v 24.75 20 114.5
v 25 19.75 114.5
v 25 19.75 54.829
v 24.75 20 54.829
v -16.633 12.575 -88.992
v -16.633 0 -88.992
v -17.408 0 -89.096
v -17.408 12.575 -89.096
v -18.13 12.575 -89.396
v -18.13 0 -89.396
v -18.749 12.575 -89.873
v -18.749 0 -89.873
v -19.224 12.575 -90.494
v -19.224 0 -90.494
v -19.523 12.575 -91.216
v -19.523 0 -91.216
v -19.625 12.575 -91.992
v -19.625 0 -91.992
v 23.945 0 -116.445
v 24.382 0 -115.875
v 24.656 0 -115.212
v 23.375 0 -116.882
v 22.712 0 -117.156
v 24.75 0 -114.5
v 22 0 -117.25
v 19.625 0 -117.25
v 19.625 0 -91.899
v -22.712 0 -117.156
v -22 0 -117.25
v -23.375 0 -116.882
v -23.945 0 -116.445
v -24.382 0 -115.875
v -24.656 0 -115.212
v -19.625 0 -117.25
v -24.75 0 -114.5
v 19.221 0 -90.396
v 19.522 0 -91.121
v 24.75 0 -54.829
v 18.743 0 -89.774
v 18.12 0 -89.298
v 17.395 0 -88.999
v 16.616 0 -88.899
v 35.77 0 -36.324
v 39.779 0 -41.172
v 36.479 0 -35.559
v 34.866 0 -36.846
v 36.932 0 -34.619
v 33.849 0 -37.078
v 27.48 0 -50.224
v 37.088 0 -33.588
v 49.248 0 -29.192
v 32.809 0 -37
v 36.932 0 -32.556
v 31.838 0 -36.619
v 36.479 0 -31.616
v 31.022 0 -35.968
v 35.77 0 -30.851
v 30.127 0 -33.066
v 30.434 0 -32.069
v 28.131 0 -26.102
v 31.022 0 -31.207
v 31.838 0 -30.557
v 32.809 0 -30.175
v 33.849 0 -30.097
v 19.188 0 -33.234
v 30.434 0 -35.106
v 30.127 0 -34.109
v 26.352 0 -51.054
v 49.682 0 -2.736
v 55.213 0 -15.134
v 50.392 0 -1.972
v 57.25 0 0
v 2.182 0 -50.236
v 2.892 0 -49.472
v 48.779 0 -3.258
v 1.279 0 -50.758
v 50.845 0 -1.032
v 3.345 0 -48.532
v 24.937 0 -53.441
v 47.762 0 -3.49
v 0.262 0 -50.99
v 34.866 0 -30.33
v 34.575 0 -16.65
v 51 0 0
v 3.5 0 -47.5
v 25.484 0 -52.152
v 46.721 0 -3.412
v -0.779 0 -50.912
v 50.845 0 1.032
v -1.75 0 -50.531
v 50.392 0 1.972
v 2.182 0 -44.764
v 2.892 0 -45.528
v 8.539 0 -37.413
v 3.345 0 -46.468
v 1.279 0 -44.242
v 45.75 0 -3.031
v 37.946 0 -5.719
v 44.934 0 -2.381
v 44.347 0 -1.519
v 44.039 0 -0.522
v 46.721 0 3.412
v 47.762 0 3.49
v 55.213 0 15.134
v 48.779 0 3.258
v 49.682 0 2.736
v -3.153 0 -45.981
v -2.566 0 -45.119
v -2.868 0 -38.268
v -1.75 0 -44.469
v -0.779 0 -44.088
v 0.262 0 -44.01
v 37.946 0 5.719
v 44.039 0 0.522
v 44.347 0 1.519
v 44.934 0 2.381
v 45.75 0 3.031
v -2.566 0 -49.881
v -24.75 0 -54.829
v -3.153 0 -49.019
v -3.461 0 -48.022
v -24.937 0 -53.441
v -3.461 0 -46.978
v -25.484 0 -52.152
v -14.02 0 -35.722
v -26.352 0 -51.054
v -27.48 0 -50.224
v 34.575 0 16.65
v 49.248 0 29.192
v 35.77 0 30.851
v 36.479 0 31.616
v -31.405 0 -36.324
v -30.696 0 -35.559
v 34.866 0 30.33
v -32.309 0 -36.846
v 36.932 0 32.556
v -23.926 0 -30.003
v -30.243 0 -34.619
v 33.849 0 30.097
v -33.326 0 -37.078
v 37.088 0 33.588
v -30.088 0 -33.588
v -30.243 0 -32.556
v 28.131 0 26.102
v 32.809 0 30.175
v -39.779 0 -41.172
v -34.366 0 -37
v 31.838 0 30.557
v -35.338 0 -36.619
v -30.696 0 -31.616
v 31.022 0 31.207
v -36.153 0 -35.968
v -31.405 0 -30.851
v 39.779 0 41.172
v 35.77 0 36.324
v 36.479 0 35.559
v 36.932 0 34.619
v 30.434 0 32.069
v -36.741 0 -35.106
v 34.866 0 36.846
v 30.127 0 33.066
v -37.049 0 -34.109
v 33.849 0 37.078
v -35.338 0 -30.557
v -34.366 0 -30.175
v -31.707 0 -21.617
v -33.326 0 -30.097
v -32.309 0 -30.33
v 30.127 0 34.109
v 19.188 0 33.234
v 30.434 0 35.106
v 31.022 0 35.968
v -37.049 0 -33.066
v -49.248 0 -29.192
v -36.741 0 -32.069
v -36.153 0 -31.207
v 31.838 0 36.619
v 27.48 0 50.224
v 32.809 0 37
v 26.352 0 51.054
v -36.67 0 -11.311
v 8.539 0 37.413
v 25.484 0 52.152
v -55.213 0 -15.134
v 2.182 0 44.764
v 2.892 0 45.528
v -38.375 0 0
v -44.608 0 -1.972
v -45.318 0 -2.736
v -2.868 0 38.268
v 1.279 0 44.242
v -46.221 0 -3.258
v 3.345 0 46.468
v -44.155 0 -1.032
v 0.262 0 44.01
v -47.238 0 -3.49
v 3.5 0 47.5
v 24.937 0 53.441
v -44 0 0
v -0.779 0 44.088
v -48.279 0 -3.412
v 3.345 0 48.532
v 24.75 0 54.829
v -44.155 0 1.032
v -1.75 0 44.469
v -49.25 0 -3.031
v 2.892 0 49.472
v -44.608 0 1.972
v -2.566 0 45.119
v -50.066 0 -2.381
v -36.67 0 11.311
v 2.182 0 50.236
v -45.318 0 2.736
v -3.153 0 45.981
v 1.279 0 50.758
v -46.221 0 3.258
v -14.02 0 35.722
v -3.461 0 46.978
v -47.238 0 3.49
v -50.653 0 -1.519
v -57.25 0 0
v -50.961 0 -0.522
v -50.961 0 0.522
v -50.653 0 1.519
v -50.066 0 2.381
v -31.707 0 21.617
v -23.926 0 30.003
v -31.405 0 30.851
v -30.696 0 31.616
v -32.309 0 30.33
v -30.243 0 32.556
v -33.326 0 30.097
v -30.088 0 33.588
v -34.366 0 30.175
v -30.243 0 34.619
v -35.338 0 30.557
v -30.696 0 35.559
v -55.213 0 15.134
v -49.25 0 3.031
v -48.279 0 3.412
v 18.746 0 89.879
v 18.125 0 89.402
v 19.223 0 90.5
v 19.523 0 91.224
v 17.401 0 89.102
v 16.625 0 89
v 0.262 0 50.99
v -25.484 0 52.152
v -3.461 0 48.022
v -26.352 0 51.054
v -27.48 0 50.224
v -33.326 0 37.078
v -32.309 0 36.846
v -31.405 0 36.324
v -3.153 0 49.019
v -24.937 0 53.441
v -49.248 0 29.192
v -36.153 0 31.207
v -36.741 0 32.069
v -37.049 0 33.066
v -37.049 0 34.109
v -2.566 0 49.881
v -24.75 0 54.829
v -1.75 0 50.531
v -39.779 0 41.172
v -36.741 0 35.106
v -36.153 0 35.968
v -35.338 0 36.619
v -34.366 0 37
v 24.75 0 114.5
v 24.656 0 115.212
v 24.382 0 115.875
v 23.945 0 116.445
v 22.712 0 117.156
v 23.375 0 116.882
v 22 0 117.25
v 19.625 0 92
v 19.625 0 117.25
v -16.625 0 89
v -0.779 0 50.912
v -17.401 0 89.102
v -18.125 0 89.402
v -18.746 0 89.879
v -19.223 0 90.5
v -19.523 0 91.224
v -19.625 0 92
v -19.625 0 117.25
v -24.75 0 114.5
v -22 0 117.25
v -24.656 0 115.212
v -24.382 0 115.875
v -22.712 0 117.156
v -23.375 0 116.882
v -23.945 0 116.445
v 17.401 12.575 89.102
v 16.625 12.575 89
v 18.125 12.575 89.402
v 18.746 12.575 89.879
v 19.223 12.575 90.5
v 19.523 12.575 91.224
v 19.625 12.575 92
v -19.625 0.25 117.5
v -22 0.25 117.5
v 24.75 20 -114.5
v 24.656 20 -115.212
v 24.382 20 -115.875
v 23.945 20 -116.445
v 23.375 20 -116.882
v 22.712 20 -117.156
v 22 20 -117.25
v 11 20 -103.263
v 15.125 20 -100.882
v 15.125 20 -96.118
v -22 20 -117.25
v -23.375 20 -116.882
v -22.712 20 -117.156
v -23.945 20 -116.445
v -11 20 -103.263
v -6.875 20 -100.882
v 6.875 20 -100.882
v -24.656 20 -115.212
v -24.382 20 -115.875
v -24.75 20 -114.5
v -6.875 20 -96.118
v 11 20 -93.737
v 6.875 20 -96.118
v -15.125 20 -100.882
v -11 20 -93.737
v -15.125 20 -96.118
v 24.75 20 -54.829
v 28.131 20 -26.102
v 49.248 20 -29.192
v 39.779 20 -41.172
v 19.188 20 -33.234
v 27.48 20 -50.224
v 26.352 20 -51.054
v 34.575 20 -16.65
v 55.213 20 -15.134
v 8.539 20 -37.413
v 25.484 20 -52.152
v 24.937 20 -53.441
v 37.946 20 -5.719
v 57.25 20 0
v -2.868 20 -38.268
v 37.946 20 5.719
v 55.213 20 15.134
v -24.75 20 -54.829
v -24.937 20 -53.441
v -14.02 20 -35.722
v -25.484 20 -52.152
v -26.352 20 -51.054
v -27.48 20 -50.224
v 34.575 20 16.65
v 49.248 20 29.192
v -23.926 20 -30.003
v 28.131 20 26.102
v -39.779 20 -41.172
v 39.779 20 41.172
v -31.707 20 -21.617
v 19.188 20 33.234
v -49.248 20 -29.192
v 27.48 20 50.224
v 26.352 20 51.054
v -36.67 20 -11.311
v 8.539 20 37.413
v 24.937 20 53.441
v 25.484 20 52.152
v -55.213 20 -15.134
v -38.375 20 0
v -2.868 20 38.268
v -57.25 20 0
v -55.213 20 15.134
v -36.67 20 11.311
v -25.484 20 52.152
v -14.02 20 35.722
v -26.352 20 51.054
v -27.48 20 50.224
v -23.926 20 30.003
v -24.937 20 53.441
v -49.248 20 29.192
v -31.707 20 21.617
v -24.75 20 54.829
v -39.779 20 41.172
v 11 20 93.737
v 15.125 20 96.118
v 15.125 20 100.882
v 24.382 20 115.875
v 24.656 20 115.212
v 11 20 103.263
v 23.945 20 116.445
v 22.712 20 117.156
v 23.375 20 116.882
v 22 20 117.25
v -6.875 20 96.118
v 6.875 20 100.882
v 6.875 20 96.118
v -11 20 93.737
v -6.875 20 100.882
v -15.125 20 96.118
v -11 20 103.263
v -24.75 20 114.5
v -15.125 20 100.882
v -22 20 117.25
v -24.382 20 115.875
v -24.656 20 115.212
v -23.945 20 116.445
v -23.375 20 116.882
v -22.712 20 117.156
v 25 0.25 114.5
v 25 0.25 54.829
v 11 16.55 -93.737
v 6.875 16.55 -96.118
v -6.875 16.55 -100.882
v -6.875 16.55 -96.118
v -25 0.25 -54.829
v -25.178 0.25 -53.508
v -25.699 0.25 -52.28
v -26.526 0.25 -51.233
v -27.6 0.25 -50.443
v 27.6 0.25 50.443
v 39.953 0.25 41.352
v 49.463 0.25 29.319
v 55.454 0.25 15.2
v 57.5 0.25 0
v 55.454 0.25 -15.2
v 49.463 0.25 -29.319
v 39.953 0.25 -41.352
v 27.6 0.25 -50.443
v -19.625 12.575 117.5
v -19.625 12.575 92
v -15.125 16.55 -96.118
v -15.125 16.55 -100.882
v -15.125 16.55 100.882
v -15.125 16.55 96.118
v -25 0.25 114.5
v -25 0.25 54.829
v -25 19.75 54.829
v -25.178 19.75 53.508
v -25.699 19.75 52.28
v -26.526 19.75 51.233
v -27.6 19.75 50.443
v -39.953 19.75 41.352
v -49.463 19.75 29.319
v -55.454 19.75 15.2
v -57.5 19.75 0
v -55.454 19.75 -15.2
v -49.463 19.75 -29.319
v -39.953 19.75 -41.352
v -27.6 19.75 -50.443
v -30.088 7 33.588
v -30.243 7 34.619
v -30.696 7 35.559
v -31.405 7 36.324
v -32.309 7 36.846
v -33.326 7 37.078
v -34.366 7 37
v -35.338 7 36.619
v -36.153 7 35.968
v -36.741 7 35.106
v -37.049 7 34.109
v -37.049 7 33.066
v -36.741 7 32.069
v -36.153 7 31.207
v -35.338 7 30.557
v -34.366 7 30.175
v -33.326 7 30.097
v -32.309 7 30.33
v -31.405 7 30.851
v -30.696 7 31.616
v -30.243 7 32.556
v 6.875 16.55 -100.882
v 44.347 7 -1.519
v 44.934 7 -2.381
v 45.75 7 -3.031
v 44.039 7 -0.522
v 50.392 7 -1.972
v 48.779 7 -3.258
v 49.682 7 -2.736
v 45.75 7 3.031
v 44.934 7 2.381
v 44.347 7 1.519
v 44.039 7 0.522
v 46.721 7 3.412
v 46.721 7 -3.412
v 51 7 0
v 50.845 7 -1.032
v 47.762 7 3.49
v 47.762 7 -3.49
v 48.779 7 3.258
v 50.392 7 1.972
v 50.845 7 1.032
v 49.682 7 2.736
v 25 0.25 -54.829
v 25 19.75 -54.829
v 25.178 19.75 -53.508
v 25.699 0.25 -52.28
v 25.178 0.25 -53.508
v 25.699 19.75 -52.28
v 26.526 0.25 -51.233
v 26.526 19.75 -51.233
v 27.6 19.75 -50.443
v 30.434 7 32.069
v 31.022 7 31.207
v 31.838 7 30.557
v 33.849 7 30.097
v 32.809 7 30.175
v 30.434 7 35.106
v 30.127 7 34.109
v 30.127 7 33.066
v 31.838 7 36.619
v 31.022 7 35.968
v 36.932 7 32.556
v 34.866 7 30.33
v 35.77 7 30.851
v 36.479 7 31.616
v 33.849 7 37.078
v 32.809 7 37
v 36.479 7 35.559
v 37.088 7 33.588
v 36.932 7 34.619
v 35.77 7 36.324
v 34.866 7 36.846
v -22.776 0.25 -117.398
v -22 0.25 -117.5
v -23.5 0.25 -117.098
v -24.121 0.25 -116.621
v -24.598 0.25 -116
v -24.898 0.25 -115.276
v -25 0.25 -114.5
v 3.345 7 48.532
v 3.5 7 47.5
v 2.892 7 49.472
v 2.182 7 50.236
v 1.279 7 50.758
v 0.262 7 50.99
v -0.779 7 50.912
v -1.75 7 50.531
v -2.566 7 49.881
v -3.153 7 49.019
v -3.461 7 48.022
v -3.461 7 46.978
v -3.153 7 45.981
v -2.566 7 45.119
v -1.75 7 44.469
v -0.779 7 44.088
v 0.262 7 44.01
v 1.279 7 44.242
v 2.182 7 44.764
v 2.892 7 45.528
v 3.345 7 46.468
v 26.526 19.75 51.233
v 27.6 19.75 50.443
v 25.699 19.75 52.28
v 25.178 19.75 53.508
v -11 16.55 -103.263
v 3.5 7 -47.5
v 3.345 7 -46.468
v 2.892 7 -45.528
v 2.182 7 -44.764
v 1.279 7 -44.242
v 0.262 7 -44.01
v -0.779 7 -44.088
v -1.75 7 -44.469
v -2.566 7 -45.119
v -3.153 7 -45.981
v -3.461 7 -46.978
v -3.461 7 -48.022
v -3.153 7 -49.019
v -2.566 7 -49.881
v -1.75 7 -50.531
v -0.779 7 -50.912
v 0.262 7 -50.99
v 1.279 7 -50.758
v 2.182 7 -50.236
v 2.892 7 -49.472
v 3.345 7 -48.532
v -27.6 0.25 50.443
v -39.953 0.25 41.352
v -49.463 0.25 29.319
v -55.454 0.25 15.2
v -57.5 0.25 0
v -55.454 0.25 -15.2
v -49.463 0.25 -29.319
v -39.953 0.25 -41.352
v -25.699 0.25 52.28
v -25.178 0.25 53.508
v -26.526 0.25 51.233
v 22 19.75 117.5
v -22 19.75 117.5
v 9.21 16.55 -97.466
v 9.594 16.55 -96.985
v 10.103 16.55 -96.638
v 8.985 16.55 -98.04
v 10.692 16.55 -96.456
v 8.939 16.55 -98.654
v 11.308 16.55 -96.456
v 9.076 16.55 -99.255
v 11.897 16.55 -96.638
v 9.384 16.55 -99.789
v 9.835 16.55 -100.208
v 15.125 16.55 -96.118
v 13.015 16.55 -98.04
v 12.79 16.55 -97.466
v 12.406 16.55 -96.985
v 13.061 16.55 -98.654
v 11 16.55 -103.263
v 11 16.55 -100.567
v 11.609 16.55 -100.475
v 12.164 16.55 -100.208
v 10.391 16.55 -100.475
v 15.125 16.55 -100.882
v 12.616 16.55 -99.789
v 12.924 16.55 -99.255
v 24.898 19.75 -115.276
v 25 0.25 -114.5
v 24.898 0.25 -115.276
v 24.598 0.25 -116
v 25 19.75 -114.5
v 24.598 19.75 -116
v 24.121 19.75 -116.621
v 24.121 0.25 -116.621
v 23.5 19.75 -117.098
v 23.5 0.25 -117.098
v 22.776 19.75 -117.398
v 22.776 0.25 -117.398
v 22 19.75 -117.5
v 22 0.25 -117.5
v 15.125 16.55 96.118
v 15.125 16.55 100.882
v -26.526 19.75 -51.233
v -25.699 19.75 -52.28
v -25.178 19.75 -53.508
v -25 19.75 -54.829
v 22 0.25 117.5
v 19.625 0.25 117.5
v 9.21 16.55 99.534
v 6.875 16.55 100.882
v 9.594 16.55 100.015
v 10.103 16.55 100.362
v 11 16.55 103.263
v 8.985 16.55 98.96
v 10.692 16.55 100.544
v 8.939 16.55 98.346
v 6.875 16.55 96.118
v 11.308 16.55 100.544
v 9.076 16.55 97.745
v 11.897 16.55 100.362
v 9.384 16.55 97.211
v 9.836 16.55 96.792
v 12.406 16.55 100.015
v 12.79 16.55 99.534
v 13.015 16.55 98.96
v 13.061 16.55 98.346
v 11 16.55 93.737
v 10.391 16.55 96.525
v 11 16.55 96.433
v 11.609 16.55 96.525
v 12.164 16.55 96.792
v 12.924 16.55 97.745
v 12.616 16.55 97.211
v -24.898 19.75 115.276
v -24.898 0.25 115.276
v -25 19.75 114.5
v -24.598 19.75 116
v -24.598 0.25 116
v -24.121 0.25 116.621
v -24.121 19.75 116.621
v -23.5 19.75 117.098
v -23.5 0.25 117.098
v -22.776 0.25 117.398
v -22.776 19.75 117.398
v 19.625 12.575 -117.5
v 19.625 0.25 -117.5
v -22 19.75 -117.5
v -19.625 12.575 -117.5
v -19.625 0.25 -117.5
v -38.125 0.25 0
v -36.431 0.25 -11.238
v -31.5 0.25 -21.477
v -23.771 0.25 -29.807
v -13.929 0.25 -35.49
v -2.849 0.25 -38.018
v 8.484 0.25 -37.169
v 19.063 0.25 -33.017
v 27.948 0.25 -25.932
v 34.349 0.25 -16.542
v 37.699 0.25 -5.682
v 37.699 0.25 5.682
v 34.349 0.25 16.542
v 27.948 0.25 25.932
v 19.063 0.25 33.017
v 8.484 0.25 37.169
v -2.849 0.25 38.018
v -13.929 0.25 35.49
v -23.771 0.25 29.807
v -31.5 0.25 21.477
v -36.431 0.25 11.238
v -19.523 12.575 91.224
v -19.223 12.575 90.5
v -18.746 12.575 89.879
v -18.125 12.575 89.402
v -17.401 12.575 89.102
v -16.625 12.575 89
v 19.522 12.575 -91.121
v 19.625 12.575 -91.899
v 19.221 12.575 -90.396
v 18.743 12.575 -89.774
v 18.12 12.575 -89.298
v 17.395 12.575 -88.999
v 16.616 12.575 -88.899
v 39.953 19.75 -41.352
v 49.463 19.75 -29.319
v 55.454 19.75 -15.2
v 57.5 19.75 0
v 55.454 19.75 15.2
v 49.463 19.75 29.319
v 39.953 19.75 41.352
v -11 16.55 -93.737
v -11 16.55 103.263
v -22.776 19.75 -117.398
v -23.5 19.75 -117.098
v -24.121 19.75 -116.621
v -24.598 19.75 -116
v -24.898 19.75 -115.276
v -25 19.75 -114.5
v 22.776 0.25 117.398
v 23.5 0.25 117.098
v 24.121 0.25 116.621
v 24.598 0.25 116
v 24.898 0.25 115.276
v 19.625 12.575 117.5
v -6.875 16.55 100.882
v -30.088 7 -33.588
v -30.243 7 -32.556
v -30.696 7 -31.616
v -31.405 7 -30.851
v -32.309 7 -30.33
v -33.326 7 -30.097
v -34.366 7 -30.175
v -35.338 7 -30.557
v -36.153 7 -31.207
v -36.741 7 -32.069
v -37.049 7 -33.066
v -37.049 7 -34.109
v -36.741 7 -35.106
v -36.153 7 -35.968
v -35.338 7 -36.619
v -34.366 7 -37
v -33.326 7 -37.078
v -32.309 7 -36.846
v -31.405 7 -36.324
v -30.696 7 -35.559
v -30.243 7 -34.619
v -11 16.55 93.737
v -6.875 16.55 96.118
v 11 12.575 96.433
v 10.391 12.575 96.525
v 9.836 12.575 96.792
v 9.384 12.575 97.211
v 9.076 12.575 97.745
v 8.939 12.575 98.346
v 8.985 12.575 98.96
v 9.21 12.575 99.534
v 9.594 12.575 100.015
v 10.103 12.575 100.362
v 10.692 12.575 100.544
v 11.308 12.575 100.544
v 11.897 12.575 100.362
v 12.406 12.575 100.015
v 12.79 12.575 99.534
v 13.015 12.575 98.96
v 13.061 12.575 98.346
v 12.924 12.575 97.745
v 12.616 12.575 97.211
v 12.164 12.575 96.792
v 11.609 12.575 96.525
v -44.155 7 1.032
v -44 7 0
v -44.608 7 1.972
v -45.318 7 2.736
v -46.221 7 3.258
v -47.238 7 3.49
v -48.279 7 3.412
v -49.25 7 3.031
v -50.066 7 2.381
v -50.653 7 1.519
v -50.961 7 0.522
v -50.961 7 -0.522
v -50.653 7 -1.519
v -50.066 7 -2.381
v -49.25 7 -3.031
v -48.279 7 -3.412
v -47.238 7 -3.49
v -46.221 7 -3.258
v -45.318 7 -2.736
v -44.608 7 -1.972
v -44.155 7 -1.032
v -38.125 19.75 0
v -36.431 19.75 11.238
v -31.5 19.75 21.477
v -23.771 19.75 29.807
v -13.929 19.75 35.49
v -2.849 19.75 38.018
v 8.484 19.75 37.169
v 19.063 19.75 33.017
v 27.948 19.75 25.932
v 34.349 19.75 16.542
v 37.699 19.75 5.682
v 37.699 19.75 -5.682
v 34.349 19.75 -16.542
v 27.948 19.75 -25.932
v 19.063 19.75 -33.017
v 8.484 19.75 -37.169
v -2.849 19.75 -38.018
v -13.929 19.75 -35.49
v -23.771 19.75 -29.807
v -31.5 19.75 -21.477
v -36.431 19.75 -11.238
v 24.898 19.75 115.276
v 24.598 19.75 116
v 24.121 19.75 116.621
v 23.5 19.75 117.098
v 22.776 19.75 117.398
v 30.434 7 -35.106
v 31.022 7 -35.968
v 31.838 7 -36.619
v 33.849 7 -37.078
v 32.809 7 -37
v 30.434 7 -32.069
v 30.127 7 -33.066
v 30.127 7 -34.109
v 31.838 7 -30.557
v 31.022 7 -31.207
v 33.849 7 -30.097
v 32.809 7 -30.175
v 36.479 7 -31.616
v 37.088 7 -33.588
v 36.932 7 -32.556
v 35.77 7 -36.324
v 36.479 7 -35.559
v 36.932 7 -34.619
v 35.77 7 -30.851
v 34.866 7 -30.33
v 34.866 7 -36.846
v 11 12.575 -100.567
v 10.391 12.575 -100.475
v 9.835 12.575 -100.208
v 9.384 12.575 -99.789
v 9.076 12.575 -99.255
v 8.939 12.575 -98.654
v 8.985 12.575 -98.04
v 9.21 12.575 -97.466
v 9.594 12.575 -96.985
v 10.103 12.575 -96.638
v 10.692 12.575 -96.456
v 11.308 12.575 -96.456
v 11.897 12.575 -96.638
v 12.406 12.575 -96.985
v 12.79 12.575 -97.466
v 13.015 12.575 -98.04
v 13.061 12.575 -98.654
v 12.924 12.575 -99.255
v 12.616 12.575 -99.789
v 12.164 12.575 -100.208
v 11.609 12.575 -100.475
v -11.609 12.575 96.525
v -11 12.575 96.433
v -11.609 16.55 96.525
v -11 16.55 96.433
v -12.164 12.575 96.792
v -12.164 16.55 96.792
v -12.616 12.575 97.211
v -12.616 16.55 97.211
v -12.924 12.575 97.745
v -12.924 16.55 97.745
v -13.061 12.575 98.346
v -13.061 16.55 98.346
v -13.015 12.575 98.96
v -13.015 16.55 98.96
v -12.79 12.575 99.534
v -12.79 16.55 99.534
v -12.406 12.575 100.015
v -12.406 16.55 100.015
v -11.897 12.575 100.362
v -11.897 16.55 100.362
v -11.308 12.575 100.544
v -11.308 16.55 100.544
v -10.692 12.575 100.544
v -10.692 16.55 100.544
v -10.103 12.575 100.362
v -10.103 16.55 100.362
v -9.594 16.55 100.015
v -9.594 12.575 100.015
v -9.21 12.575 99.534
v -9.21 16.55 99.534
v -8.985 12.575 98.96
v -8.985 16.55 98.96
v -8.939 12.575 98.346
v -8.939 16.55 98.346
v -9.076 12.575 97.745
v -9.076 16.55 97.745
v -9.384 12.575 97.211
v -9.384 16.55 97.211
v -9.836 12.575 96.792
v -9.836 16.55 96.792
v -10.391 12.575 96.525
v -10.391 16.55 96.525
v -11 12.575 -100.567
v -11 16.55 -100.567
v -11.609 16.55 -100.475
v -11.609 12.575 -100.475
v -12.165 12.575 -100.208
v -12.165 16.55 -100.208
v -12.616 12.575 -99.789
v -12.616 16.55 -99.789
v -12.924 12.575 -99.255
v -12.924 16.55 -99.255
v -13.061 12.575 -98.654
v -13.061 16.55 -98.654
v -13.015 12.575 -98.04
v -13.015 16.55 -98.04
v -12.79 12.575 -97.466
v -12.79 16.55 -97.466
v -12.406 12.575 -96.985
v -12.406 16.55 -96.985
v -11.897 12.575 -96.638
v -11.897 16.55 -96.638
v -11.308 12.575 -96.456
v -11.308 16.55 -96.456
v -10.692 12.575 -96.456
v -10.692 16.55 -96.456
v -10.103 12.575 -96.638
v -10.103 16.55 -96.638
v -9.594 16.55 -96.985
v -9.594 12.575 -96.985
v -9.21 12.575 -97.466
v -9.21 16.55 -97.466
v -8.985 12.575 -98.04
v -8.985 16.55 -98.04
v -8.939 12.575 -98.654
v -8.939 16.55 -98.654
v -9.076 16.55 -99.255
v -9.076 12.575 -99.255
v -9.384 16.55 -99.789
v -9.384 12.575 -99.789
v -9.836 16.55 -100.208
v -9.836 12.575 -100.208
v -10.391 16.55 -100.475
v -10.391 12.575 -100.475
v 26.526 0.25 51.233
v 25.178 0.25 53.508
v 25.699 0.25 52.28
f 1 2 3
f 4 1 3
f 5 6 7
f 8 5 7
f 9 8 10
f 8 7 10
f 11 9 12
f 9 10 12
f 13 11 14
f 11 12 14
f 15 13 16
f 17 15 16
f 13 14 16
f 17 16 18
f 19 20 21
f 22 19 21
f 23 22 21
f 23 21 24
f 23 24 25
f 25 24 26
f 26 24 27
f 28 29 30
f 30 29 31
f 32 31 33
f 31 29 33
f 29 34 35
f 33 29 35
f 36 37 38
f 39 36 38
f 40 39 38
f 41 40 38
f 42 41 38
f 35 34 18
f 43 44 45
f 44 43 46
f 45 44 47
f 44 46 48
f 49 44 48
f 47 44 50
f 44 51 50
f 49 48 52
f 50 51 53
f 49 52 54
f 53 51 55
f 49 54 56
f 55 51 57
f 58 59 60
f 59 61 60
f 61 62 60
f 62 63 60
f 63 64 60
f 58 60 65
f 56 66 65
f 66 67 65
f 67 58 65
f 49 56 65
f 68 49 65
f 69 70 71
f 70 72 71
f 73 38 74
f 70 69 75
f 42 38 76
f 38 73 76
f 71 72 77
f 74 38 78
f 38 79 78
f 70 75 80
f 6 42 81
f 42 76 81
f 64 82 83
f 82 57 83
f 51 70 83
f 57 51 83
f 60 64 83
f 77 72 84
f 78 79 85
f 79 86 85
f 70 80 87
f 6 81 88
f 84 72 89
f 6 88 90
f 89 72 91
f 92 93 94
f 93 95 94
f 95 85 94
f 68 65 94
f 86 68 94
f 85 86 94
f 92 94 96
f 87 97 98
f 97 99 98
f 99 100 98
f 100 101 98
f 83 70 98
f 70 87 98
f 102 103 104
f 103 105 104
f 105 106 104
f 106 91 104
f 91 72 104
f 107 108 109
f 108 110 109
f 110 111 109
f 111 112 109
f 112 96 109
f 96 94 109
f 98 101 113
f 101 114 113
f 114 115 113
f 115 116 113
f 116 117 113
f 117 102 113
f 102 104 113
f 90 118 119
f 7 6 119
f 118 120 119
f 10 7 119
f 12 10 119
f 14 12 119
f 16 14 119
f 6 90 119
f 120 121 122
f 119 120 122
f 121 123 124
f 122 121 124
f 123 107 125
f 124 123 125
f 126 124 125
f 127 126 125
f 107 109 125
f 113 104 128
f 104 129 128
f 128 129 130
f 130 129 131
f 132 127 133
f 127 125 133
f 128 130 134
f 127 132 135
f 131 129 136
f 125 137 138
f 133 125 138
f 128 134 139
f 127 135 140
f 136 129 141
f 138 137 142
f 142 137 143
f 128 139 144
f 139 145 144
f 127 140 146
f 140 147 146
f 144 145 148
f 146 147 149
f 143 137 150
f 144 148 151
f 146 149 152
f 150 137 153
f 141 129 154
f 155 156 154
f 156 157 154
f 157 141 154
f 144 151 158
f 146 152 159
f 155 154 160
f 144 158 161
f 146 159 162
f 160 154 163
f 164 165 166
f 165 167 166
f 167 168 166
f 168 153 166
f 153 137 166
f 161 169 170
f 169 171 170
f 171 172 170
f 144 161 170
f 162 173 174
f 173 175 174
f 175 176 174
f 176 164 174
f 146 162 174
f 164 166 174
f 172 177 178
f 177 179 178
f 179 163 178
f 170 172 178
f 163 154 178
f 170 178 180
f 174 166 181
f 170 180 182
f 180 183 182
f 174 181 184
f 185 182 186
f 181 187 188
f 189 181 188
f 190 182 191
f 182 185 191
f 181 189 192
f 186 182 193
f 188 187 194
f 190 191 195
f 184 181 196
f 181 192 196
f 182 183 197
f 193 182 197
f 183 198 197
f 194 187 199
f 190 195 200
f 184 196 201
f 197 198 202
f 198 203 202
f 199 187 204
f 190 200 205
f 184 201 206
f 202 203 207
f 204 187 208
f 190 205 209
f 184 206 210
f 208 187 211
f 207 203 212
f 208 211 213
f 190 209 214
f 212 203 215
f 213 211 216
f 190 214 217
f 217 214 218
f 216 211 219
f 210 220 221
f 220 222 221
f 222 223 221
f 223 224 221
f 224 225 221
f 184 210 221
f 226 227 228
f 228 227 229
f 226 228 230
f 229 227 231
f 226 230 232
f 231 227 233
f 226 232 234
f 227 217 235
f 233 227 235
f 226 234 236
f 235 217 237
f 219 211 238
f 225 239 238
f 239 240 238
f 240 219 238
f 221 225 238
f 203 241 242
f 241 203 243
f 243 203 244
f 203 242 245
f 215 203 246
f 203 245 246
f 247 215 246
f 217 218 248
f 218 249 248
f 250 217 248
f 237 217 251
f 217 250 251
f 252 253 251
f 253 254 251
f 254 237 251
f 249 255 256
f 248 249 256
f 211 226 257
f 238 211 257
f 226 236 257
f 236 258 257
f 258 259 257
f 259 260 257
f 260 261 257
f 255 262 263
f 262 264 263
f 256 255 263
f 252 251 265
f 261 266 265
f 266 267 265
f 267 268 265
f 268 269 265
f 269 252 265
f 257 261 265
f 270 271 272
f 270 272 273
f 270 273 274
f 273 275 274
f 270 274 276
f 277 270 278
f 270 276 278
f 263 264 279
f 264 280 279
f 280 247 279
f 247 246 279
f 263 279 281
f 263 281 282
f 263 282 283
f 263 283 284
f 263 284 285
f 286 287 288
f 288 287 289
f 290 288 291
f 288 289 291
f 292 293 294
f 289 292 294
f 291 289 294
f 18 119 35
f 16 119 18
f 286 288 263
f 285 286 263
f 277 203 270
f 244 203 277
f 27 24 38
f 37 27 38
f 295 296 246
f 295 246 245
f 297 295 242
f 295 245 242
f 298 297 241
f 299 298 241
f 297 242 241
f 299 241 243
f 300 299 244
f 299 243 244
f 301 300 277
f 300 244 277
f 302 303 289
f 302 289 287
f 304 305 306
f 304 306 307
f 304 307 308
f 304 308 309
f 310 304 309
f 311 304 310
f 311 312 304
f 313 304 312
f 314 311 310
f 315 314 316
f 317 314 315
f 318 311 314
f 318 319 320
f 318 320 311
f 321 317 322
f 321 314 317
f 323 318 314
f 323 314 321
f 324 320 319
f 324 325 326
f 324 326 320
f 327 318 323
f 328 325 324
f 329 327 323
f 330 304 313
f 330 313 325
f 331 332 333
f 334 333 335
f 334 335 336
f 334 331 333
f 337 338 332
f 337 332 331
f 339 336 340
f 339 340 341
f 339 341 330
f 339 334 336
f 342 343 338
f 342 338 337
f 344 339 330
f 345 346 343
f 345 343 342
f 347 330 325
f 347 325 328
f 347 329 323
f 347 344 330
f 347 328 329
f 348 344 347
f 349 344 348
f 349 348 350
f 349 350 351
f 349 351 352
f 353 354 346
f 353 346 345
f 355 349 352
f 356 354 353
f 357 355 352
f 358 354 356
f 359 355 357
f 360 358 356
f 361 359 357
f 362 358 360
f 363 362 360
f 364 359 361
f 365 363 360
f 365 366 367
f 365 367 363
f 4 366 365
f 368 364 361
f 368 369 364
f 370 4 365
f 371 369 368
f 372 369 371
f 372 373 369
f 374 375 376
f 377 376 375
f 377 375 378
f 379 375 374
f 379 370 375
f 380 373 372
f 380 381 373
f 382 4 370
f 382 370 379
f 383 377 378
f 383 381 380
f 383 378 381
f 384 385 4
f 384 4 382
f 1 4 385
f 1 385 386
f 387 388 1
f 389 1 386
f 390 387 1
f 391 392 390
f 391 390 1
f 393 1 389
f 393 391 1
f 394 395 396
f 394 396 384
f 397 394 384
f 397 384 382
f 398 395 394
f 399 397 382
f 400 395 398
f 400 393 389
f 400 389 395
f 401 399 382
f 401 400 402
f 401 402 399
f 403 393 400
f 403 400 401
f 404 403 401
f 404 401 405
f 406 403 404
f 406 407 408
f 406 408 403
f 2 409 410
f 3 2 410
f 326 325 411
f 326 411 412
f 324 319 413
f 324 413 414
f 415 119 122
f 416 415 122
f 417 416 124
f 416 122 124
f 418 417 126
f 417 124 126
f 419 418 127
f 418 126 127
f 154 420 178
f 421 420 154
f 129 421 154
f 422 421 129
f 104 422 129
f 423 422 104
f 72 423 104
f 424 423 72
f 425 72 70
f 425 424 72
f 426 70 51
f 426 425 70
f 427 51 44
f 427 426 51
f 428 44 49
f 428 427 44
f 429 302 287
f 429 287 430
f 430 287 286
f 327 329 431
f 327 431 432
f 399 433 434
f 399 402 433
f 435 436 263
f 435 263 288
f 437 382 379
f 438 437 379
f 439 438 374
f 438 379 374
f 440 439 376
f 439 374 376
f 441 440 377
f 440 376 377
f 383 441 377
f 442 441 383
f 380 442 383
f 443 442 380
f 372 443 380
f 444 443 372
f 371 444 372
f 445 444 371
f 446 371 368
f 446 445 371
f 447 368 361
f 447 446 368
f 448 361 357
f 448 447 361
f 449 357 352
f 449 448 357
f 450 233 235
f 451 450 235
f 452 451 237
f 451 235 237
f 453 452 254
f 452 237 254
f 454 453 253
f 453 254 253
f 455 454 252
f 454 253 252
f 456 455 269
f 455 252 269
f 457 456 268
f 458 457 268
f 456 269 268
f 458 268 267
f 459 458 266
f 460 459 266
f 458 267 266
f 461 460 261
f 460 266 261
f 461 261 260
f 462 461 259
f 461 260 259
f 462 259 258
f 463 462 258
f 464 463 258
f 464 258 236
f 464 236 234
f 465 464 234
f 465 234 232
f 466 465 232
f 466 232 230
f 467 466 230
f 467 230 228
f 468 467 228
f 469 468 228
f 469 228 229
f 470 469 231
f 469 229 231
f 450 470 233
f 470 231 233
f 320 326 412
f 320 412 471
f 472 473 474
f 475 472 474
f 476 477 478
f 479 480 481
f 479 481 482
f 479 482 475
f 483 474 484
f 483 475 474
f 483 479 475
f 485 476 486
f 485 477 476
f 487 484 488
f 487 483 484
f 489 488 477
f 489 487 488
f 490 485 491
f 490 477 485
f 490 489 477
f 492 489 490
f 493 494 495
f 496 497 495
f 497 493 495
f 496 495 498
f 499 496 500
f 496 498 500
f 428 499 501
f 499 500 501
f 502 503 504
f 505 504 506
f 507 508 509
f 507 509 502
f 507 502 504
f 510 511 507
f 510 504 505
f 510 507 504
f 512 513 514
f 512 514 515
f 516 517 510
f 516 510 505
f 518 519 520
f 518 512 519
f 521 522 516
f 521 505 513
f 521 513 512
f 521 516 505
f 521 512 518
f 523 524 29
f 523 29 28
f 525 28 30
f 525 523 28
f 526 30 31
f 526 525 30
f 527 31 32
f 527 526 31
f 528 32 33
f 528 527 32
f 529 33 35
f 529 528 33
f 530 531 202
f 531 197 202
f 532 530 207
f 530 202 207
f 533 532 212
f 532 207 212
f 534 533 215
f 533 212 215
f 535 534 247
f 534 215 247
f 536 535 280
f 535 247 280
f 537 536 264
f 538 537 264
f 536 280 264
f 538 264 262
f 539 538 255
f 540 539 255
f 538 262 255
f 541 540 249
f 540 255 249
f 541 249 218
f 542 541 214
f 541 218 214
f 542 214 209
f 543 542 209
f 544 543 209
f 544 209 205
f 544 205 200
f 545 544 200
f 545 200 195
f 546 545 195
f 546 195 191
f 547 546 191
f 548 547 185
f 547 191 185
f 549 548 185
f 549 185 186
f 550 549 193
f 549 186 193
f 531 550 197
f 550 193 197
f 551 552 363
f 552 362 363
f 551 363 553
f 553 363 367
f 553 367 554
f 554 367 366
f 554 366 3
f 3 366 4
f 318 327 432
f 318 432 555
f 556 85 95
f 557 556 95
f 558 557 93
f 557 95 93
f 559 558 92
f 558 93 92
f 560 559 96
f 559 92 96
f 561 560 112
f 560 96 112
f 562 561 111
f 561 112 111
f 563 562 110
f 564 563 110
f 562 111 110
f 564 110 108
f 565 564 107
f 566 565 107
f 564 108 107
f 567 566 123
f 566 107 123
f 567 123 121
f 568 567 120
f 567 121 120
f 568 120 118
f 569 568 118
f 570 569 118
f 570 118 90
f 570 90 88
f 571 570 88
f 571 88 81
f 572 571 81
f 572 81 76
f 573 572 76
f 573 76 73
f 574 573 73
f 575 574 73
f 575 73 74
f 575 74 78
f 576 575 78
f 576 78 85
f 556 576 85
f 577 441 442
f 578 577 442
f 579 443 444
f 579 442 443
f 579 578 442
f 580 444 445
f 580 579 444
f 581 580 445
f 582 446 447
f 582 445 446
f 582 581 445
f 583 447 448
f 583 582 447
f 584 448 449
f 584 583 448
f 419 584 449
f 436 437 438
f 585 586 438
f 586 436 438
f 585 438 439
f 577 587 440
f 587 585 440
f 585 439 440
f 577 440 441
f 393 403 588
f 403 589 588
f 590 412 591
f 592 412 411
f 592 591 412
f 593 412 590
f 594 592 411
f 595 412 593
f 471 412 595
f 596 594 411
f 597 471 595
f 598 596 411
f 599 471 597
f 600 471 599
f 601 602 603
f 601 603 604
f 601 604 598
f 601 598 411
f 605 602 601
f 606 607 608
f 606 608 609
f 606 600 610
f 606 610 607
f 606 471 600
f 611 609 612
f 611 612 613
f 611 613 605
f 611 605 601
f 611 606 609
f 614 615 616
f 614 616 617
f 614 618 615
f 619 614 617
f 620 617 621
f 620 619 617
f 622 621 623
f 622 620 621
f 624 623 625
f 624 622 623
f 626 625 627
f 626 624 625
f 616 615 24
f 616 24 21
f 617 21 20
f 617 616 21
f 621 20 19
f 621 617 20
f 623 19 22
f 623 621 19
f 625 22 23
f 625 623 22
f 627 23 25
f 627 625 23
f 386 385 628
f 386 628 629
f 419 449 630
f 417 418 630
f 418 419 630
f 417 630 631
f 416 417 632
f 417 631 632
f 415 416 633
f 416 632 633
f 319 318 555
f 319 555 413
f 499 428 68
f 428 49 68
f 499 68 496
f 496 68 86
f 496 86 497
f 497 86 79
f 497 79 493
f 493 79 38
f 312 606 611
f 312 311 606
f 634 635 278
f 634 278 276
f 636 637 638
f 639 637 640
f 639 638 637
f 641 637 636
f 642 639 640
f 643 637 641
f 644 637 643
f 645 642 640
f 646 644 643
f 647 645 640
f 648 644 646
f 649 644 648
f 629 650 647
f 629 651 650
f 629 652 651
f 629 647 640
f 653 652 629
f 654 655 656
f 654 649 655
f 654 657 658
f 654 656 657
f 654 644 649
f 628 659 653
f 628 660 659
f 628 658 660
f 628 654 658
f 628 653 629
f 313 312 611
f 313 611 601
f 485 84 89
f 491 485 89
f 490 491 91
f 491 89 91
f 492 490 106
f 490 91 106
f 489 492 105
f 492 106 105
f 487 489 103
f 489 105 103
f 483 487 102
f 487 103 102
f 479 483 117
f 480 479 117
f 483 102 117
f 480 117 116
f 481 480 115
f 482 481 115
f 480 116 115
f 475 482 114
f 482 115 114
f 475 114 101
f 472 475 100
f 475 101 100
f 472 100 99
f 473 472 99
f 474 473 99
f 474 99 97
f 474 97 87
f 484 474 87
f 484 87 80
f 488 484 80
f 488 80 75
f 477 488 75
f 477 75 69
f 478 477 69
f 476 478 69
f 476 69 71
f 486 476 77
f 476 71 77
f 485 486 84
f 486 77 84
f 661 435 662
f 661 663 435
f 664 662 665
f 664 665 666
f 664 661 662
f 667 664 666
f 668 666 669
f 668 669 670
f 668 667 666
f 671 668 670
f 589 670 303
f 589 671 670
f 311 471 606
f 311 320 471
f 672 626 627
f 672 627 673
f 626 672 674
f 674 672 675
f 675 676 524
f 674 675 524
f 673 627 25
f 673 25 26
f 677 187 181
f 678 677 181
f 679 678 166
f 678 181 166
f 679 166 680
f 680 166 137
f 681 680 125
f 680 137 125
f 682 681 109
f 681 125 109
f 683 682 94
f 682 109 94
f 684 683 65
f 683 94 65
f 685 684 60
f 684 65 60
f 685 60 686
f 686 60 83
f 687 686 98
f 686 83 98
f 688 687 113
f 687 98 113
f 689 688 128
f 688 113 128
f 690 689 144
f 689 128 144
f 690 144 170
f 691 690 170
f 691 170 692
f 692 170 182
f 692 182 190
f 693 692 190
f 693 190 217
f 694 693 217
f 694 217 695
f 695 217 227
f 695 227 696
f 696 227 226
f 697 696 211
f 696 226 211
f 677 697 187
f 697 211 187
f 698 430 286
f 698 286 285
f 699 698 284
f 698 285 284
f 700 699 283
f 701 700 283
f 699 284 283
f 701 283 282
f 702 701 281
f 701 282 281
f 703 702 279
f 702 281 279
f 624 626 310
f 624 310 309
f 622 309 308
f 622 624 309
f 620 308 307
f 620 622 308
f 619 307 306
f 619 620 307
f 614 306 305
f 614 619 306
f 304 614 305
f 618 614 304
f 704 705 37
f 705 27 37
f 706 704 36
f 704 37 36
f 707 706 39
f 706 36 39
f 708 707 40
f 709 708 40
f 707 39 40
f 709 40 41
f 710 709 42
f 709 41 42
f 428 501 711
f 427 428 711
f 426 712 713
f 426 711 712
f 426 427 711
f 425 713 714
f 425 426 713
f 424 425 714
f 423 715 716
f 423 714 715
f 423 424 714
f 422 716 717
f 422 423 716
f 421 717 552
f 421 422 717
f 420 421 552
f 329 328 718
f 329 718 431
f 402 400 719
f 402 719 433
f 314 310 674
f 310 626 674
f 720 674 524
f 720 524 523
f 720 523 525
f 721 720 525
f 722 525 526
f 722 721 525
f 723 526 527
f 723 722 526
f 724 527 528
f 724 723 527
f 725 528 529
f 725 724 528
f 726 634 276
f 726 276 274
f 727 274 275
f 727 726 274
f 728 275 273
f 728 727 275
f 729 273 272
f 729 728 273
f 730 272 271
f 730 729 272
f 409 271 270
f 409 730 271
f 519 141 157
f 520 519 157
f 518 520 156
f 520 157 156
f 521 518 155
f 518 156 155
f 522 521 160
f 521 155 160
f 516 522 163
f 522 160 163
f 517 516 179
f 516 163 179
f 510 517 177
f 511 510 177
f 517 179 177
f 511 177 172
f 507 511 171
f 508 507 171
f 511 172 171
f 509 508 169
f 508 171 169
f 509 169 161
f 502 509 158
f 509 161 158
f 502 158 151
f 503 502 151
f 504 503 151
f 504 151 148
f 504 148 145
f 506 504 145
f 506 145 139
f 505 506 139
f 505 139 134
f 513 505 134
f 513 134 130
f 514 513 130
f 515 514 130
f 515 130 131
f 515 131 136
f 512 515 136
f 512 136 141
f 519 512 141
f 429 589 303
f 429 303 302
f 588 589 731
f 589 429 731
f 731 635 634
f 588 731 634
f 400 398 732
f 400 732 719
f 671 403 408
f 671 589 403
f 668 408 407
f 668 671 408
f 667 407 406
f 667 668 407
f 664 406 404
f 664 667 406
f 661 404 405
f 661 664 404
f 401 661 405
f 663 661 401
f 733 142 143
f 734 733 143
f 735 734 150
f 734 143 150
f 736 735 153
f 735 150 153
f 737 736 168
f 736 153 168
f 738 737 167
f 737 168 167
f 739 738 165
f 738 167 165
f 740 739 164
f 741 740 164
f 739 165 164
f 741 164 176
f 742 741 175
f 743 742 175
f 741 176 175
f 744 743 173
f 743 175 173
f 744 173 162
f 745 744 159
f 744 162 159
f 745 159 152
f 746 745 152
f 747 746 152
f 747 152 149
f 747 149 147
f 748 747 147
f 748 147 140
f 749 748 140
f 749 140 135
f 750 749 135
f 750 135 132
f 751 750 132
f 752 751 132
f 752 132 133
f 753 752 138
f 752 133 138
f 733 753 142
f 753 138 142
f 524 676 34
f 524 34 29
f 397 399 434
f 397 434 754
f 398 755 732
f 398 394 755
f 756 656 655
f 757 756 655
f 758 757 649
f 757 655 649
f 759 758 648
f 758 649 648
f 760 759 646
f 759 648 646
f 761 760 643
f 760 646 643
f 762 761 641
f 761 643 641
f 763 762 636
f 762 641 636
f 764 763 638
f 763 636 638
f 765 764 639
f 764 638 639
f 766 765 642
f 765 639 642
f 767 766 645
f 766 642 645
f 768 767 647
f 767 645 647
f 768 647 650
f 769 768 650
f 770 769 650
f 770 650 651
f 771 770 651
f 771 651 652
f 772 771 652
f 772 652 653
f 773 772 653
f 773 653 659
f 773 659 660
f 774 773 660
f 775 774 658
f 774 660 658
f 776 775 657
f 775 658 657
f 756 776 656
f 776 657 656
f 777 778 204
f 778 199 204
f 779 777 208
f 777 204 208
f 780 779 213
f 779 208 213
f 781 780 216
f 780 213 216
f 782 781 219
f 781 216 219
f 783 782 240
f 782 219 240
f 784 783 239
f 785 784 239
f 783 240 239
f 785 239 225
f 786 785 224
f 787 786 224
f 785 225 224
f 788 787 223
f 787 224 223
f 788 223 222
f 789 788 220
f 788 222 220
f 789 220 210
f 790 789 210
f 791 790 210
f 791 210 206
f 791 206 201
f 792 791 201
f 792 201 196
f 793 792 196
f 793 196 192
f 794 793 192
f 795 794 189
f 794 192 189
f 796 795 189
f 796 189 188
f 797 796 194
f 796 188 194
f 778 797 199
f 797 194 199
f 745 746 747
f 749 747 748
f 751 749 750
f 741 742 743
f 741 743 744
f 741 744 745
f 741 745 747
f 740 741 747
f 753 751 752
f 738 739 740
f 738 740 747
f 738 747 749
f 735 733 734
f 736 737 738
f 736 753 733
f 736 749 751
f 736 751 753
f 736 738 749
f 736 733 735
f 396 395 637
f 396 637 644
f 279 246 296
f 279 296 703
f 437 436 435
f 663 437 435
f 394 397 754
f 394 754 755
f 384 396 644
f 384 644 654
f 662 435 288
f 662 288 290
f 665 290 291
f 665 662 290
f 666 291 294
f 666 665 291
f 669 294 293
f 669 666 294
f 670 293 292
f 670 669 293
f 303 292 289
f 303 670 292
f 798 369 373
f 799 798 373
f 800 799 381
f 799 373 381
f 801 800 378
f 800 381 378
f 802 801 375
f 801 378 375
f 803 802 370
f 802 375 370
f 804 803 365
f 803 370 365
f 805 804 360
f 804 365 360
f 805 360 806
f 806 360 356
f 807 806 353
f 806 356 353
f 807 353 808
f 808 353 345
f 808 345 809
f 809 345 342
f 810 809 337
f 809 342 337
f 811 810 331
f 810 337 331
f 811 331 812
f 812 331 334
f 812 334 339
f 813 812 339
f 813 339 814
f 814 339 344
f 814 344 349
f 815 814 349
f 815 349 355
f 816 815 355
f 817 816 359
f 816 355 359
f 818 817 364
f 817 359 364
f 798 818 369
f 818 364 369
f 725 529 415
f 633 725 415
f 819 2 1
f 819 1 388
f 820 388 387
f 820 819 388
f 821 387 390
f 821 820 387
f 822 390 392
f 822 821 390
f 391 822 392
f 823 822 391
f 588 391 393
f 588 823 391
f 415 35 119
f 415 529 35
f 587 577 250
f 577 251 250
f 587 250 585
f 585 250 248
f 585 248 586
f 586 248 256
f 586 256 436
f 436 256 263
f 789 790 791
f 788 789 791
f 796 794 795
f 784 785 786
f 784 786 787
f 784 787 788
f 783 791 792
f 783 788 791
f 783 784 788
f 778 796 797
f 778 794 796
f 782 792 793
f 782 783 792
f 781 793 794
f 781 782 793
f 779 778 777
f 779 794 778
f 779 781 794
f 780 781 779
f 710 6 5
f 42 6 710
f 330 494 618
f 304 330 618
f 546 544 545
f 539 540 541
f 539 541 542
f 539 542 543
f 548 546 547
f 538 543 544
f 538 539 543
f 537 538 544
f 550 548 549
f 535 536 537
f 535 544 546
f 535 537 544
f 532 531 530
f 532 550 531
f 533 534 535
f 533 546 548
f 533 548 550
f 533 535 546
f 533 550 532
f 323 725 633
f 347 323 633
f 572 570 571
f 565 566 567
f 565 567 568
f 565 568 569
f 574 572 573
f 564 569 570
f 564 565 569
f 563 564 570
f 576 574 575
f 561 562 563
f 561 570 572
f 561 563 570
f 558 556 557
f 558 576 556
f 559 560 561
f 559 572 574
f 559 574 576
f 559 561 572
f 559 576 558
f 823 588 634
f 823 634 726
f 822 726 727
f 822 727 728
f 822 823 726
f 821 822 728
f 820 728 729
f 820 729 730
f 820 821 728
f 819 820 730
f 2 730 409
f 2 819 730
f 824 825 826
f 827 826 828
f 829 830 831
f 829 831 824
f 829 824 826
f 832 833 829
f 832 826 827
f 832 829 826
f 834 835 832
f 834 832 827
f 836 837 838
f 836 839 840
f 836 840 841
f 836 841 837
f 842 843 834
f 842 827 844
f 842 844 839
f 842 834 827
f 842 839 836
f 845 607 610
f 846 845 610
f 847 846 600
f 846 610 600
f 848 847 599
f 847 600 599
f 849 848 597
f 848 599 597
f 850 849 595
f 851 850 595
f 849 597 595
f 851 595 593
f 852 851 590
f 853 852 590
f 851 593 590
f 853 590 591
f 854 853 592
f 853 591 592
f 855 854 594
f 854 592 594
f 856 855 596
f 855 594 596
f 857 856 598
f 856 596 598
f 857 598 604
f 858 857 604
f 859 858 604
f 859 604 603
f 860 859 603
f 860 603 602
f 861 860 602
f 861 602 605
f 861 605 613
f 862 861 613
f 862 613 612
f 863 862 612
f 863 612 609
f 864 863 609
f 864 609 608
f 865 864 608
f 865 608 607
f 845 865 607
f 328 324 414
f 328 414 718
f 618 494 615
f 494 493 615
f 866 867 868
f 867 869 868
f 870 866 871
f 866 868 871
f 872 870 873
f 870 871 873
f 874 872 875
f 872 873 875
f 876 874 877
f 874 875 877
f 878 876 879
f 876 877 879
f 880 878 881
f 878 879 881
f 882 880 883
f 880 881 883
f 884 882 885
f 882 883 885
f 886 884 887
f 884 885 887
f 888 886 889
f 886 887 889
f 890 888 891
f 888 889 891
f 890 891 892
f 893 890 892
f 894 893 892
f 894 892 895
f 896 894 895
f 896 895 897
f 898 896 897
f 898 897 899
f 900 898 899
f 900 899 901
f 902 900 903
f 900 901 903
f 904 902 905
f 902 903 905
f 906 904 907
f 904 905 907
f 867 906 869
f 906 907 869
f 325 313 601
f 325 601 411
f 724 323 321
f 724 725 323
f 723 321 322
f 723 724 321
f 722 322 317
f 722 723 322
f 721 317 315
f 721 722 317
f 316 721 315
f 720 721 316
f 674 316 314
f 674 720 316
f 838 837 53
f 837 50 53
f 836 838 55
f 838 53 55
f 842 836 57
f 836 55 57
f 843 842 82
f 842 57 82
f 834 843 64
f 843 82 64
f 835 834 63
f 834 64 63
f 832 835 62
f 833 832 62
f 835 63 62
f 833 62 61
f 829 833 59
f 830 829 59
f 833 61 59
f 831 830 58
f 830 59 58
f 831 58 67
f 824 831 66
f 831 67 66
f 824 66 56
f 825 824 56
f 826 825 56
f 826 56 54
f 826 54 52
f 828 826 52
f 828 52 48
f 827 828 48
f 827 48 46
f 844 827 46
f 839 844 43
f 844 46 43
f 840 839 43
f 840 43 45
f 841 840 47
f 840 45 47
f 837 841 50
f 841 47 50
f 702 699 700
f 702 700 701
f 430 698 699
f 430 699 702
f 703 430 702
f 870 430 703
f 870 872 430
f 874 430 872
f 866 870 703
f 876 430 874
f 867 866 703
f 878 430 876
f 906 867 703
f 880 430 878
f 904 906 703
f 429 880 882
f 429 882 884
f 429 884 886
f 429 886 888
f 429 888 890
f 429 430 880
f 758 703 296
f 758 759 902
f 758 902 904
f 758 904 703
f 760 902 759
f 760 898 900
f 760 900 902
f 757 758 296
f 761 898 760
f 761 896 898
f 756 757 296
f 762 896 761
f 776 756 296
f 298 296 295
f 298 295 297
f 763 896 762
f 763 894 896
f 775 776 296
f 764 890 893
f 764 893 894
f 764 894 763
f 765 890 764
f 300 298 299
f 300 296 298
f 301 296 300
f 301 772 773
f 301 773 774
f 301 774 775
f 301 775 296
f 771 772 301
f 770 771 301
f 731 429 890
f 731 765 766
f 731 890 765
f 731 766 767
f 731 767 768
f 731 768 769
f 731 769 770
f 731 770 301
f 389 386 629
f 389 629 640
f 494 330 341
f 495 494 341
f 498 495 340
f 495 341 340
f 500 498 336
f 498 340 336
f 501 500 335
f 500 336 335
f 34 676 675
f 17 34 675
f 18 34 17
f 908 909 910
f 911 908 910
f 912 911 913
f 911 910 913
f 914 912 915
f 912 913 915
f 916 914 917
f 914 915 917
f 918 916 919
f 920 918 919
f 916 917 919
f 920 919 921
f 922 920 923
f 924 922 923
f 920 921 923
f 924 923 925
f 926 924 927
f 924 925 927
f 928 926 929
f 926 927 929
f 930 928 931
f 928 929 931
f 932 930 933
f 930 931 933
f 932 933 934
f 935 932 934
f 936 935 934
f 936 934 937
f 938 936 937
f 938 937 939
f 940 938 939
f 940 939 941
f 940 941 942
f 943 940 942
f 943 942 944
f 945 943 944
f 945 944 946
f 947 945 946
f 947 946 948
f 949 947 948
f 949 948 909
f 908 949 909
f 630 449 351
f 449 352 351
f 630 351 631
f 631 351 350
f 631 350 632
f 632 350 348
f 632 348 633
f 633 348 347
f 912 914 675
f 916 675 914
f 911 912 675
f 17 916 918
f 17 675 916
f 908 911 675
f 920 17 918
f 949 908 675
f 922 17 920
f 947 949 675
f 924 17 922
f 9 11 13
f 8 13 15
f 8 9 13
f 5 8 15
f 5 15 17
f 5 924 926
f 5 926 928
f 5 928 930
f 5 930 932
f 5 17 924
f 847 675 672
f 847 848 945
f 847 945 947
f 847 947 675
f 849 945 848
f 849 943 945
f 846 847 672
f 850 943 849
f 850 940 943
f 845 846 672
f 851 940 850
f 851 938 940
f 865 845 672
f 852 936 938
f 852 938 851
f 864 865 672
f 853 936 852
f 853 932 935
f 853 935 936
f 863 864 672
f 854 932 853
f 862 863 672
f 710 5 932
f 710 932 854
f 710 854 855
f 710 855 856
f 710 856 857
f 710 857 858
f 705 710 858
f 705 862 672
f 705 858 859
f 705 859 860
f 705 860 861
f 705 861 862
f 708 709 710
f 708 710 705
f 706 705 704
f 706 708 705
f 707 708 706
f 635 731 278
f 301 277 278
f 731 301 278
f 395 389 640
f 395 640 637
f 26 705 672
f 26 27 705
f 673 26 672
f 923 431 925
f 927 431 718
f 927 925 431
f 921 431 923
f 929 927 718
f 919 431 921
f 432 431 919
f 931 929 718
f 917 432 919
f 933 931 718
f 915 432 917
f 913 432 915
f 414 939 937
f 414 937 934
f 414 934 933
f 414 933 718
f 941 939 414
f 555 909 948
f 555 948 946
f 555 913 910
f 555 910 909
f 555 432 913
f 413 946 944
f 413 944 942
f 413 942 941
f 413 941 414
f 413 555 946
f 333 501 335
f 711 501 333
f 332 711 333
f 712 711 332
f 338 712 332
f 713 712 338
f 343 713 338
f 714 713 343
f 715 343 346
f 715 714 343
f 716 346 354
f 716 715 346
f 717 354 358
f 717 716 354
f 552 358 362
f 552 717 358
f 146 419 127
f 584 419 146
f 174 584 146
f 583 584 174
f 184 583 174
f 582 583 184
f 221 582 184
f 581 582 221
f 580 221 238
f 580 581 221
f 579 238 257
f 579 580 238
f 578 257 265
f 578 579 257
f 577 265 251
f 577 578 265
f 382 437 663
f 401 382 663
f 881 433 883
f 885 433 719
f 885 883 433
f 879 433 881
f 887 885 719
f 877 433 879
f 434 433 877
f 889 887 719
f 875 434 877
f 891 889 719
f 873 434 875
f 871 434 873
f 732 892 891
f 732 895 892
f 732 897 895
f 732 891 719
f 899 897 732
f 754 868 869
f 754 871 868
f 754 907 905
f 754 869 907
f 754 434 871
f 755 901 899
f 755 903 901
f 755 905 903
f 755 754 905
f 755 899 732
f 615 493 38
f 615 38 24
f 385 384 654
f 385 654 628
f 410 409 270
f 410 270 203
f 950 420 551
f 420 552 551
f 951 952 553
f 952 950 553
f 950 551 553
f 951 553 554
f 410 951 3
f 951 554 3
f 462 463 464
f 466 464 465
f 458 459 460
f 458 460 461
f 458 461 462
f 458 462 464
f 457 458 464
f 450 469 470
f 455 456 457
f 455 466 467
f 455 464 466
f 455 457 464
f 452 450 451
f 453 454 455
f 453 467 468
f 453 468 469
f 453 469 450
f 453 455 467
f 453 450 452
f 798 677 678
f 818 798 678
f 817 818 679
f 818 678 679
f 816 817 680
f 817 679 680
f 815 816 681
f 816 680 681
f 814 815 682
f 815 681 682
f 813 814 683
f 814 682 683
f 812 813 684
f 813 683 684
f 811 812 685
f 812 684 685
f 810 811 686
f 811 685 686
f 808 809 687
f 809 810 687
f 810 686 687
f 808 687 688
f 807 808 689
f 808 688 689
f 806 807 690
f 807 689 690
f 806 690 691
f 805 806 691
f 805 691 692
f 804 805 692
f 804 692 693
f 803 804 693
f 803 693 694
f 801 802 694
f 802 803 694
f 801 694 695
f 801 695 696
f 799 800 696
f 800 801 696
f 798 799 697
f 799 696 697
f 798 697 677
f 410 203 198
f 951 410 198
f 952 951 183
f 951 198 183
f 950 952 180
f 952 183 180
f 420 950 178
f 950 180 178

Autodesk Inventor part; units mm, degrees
ref_plane "YZ Plane" through (0, 0, 0) normal (1, 0, 0) x (0, 1, 0)
ref_plane "XZ Plane" through (0, 0, 0) normal (0, 1, 0) x (-1, 0, 0)
ref_plane "XY Plane" through (0, 0, 0) normal (0, 0, 1) x (1, 0, 0)
sketch "Sketch1" plane through (0, 0, 0) normal (0, 1, 0) x (-1, 0, 0)
  circle A0 centre (0, 0) radius 38.125
  line L0 (25, 117.5) -> (-25, 117.5)
  line L1 (-25, -117.5) -> (25, -117.5)
  arc A1 (-25, 51.7808) -> (-25, -51.7808) centre (0, 0) ccw
  arc A2 (25, -51.7808) -> (25, 51.7808) centre (0, 0) ccw
  line L2 (-25, 117.5) -> (-25, 51.7808)
  line L3 (-25, -51.7808) -> (-25, -117.5)
  line L4 (25, -117.5) -> (25, -51.7808)
  line L5 (25, 51.7808) -> (25, 117.5)
  dimension "d0" = 76.25
  dimension "d76" = 50
  dimension "d77" = 57.5
  dimension "d78" = 57.5
  dimension "d79" = 65.7192
  dimension "d80" = 65.7192
  dimension "d81" = 50
  dimension "d82" = 235
extrude "Extrusion1" add sketch "Sketch1" along normal blind 20
fillet "Fillet1" radius 5 4 edges at (-25, 10, 51.7808) (25, 10, 51.7808) (25, 10, -51.7808) (-25, 10, -51.7808)
fillet "Fillet2" radius 3 4 edges at (25, 10, 117.5) (-25, 10, 117.5) (25, 10, -117.5) (-25, 10, -117.5)
chamfer "Chamfer1" distance 0.25 angle 45 26 edges at (25, 20, 84.6646) (57.5, 20, 0) (25, 20, -84.6646) (24.1213, 20, -116.6213) (0, 20, -117.5) (-24.1213, 20, -116.6213) (-25, 20, -84.6646) (-57.5, 20, 0) (-25, 20, 84.6646) (-24.1213, 20, 116.6213) (0, 20, 117.5) (24.1213, 20, 116.6213) (25, 0, 84.6646) (57.5, 0, 0) (25, 0, -84.6646) (24.1213, 0, -116.6213) (0, 0, -117.5) (-24.1213, 0, -116.6213) (-25, 0, -84.6646) (-57.5, 0, 0) (-25, 0, 84.6646) (-24.1213, 0, 116.6213) (0, 0, 117.5) (24.1213, 0, 116.6213) (38.125, 20, 0) (38.125, 0, 0)
sketch "Sketch3" plane through (0, 0, 0) normal (0, -1, 0) x (1, 0, 0)
  line L0 (-22, -117.25) -> (-22, 117.25)
  line L1 (22, 117.25) -> (22, -117.25)
  line L2 (22, -117.25) -> (-22, 117.25) construction
  line L3 (-22, -117.25) -> (22, 117.25) construction
  line L4 (16.625, 89) -> (-16.625, 89)
  line L5 (-19.625, 92) -> (-19.625, 117.25)
  line L6 (19.625, 117.25) -> (19.625, 92)
  line L7 (19.625, 89) -> (17.4099, 92.7868) construction
  line L8 (-19.625, 89) -> (-17.1837, 91.5811) construction
  line L9 (-19.625, -117.25) -> (-19.625, -91.9916)
  line L10 (-16.6334, -88.9916) -> (16.6165, -88.8986)
  line L11 (19.6248, -91.8986) -> (19.6248, -117.25)
  line L12 (-17.2012, -91.6745) -> (-19.625, -89) construction
  line L13 (17.2501, -91.935) -> (19.6248, -88.8902) construction
  line L14 (22, 117.25) -> (19.625, 117.25)
  line L15 (-22, 117.5) -> (22, 117.5) projected
  line L16 (-19.625, 117.25) -> (-22, 117.25)
  arc A0 (-16.6334, -88.9916) -> (-19.625, -91.9916) centre (-16.625, -91.9916) ccw
  arc A1 (19.6248, -91.8986) -> (16.6165, -88.8986) centre (16.6248, -91.8986) ccw
  arc A2 (-19.625, 92) -> (-16.625, 89) centre (-16.625, 92) ccw
  arc A3 (16.625, 89) -> (19.625, 92) centre (16.625, 92) ccw
  line L17 (19.6248, -117.25) -> (19.6248, -121.1164)
  line L18 (19.6248, -121.1164) -> (-19.625, -121.1164)
  line L19 (-19.625, -121.1164) -> (-19.625, -117.25)
  line L20 (19.625, 117.25) -> (19.625, 123.825)
  line L21 (19.625, 123.825) -> (-19.625, 123.825)
  line L22 (-19.625, 123.825) -> (-19.625, 117.25)
  line L23 (19.625, 117.25) -> (19.6248, 117.25)
  line L24 (22, -117.25) -> (19.6248, -117.25)
  line L25 (-19.625, -117.25) -> (-22, -117.25)
  point P0 (0, 0)
  point P1 (-19.625, 117.5)
  point P2 (19.625, 117.5)
  dimension "d35" = 39.25
  dimension "d37" = 28.25
  dimension "d38" = 28.25
  dimension "d39" = 39.25
  dimension "d40" = 3
  dimension "d41" = 3
  dimension "d42" = 3
  dimension "d50" = 2.375
  dimension "d51" = 2.375
  dimension "d52" = 44
  dimension "d53" = 39.2499
  dimension "d55" = 2.3752
  dimension "d56" = 2.375
  dimension "d83" = 234.5
extrude "Extrusion4" cut sketch "Sketch3" against normal blind 12.575 contours L9 A0 L10 A1 L11 L17 L18 L19 | L22 L15 L20 L6 A3 L4 A2 L5 | L22 L21 L20 L15
sketch "Sketch4" plane through (0, 12.575, 0) normal (0, -1, 0) x (1, 0, 0)
  circle A0 centre (11, 98.5) radius 2.2451
  circle A1 centre (-11, 98.5) radius 2.3292
  circle A2 centre (10.9998, -98.5) radius 1.5784
  circle A3 centre (-11.0002, -98.5) radius 2.3162
  line L0 (19.6248, -117.5) -> (-19.625, -117.5) projected
  line L1 (-19.625, -117.5) -> (-19.625, -91.9916) projected
  line L2 (19.6248, -91.8986) -> (19.6248, -117.5) projected
  line L3 (-19.625, 117.5) -> (19.625, 117.5) projected
  line L4 (19.625, 117.25) -> (19.625, 92) projected
  point P0 (0, 0)
  point P1 (-19.625, -117.25)
  point P2 (19.6248, -117.25)
  dimension "d45" = 19
  dimension "d48" = 19
  dimension "d57" = 19
  dimension "d58" = 19
  dimension "d59" = 22
  dimension "d60" = 22
  dimension "d61" = 8.625
  dimension "d62" = 8.625
hole "Hole2" at (11, 12.575, 98.5) at (-11, 12.575, 98.5) at (10.9998, 12.575, -98.5) at (-11.0002, 12.575, -98.5) direction (0, 1, 0) diameter 4.134 end through all thread size "M5x0.8" class "6H" standard "ANSI Metric M Profile"
sketch "Sketch5" plane through (0, 20, 0) normal (0, 1, 0) x (1, 0, 0)
  circle A0 centre (-11, -98.5) radius 2.067 projected
  line L0 (-11, -93.7369) -> (-6.875, -96.1184)
  line L1 (-6.875, -96.1184) -> (-6.875, -100.8816)
  line L2 (-6.875, -100.8816) -> (-11, -103.2631)
  line L3 (-11, -103.2631) -> (-15.125, -100.8816)
  line L4 (-15.125, -100.8816) -> (-15.125, -96.1184)
  line L5 (-15.125, -96.1184) -> (-11, -93.7369)
  circle A1 centre (11, -98.5) radius 2.067 projected
  line L6 (11, -93.7369) -> (15.125, -96.1184)
  line L7 (15.125, -96.1184) -> (15.125, -100.8816)
  line L8 (15.125, -100.8816) -> (11, -103.2631)
  line L9 (11, -103.2631) -> (6.875, -100.8816)
  line L10 (6.875, -100.8816) -> (6.875, -96.1184)
  line L11 (6.875, -96.1184) -> (11, -93.7369)
  circle A2 centre (-11.0002, 98.5) radius 2.067 projected
  line L12 (-11.0002, 93.7369) -> (-15.1252, 96.1184)
  line L13 (-15.1252, 96.1184) -> (-15.1252, 100.8816)
  line L14 (-15.1252, 100.8816) -> (-11.0002, 103.2631)
  line L15 (-11.0002, 103.2631) -> (-6.8752, 100.8816)
  line L16 (-6.8752, 100.8816) -> (-6.8752, 96.1184)
  line L17 (-6.8752, 96.1184) -> (-11.0002, 93.7369)
  circle A3 centre (10.9998, 98.5) radius 2.067 projected
  line L18 (10.9998, 103.2631) -> (15.1248, 100.8816)
  line L19 (15.1248, 100.8816) -> (15.1248, 96.1184)
  line L20 (15.1248, 96.1184) -> (10.9998, 93.7369)
  line L21 (10.9998, 93.7369) -> (6.8748, 96.1184)
  line L22 (6.8748, 96.1184) -> (6.8748, 100.8816)
  line L23 (6.8748, 100.8816) -> (10.9998, 103.2631)
  point P0 (0, 0)
  point P1 (-13.0625, -102.0724)
  point P2 (-8.9377, 94.9276)
  dimension "d70" = 8.25
  dimension "d71" = 8.25
  dimension "d72" = 8.25
  dimension "d73" = 8.25
extrude "Extrusion5" cut sketch "Sketch5" against normal blind 3.45
sketch "Sketch6" plane through (0, 0, 0) normal (0, -1, 0) x (1, 0, 0)
  circle A0 centre (0, 0) radius 47.5
  circle A1 centre (0, -47.5) radius 3.5
  circle A2 centre (33.5876, -33.5876) radius 3.5
  circle A3 centre (47.5, 0) radius 3.5
  circle A4 centre (33.5876, 33.5876) radius 3.5
  circle A5 centre (0, 47.5) radius 3.5
  circle A6 centre (-33.5876, 33.5876) radius 3.5
  circle A7 centre (-47.5, 0) radius 3.5
  circle A8 centre (-33.5876, -33.5876) radius 3.5
  dimension "d84" = 95
  dimension "d85" = 7
  dimension "d88" = 360
extrude "Extrusion6" cut sketch "Sketch6" against normal blind 7 contours A0 A3 | A0 A3 | A4 A0 | A0 A4 | A2 A0 | A0 A2 | A5 A0 | A0 A5 | A1 A0 | A0 A1 | A6 A0 | A0 A6 | A8 A0 | A0 A8 | A7 A0 | A0 A7
properties part number "Head Thing"
